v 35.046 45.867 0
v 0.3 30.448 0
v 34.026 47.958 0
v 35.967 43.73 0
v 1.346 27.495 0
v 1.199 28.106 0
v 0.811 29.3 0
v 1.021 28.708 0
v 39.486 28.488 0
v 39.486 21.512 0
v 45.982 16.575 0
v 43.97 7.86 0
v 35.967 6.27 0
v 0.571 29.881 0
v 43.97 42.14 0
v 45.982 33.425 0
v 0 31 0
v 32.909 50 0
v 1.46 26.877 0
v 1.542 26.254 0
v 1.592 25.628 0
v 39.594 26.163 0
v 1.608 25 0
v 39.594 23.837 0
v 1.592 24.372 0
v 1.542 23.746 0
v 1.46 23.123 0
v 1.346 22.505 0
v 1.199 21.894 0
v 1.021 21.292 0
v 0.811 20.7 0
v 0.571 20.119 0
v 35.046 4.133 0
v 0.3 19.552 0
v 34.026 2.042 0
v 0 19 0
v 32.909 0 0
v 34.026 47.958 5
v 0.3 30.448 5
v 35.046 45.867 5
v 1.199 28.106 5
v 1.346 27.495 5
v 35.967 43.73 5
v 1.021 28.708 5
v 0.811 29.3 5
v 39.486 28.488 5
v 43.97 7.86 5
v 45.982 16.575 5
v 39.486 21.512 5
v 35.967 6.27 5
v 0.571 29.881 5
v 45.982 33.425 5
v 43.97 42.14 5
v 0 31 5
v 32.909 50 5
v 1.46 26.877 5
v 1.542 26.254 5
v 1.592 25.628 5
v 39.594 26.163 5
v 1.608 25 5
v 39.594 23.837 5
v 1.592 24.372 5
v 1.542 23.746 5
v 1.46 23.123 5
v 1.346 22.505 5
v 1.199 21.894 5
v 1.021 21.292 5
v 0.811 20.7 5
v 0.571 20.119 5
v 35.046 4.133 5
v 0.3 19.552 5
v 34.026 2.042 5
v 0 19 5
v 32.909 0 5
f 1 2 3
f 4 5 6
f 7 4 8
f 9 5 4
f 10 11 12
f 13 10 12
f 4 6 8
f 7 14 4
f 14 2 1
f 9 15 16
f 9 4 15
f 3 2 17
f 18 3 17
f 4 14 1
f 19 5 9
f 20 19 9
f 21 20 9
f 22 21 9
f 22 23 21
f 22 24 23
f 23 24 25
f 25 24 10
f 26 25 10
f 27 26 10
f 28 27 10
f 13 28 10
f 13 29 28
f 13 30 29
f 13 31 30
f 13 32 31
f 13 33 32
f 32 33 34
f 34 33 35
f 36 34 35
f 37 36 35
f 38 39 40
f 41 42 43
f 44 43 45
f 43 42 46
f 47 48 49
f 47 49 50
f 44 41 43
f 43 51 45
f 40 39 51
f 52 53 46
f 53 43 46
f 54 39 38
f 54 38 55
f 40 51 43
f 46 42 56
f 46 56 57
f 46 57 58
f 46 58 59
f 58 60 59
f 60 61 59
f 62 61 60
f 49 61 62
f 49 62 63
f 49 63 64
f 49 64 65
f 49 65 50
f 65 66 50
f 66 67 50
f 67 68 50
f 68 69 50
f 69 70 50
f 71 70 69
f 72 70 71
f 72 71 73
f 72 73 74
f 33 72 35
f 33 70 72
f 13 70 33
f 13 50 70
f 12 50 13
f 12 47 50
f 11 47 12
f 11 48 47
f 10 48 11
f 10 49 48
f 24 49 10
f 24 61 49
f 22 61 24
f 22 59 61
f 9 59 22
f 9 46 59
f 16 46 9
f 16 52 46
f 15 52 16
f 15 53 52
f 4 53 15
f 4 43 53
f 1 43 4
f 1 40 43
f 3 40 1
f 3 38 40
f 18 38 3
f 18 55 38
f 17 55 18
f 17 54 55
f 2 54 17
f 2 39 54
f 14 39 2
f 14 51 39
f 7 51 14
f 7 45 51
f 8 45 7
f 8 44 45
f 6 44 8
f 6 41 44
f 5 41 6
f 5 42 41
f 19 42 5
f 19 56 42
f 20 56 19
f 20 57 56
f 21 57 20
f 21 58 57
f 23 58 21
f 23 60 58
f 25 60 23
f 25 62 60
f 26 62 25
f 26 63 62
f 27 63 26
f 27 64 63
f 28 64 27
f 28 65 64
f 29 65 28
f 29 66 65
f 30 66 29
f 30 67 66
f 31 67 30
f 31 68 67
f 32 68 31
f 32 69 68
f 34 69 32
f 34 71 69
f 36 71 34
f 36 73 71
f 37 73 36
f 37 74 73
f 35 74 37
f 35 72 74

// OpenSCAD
$fn = 32;

// ----------------------------------------------------------------------
// Gear sector: 2 teeth on 60 degrees
// ----------------------------------------------------------------------

// --- parameters (mm) ---
sector_angle = 60;        // sector angle, degrees
root_r = 50;              // root circle radius
tooth_h = 7;              // tooth height over the root circle
teeth = 2;                // number of teeth on the sector
hub_r = 12;               // hub bore radius
plate_t = 5;              // sector thickness, Z
arc_step = 3;             // sampling step of the root/hub arcs, degrees

tip_r = root_r + tooth_h;  // tip circle radius

profile = [[32.909, 0], [34.026, 2.042], [35.046, 4.133], [35.967, 6.27], [43.97, 7.86], [45.982, 16.575], [39.486, 21.512], [39.594, 23.837], [39.594, 26.163], [39.486, 28.488], [45.982, 33.425], [43.97, 42.14], [35.967, 43.73], [35.046, 45.867], [34.026, 47.958], [32.909, 50], [0, 31], [0.3, 30.448], [0.571, 29.881], [0.811, 29.3], [1.021, 28.708], [1.199, 28.106], [1.346, 27.495], [1.46, 26.877], [1.542, 26.254], [1.592, 25.628], [1.608, 25], [1.592, 24.372], [1.542, 23.746], [1.46, 23.123], [1.346, 22.505], [1.199, 21.894], [1.021, 21.292], [0.811, 20.7], [0.571, 20.119], [0.3, 19.552], [0, 19]];  // primary outline, 37 points, counter clockwise

// --- the one profile operation ---
linear_extrude(height = plate_t) polygon(points = profile);
